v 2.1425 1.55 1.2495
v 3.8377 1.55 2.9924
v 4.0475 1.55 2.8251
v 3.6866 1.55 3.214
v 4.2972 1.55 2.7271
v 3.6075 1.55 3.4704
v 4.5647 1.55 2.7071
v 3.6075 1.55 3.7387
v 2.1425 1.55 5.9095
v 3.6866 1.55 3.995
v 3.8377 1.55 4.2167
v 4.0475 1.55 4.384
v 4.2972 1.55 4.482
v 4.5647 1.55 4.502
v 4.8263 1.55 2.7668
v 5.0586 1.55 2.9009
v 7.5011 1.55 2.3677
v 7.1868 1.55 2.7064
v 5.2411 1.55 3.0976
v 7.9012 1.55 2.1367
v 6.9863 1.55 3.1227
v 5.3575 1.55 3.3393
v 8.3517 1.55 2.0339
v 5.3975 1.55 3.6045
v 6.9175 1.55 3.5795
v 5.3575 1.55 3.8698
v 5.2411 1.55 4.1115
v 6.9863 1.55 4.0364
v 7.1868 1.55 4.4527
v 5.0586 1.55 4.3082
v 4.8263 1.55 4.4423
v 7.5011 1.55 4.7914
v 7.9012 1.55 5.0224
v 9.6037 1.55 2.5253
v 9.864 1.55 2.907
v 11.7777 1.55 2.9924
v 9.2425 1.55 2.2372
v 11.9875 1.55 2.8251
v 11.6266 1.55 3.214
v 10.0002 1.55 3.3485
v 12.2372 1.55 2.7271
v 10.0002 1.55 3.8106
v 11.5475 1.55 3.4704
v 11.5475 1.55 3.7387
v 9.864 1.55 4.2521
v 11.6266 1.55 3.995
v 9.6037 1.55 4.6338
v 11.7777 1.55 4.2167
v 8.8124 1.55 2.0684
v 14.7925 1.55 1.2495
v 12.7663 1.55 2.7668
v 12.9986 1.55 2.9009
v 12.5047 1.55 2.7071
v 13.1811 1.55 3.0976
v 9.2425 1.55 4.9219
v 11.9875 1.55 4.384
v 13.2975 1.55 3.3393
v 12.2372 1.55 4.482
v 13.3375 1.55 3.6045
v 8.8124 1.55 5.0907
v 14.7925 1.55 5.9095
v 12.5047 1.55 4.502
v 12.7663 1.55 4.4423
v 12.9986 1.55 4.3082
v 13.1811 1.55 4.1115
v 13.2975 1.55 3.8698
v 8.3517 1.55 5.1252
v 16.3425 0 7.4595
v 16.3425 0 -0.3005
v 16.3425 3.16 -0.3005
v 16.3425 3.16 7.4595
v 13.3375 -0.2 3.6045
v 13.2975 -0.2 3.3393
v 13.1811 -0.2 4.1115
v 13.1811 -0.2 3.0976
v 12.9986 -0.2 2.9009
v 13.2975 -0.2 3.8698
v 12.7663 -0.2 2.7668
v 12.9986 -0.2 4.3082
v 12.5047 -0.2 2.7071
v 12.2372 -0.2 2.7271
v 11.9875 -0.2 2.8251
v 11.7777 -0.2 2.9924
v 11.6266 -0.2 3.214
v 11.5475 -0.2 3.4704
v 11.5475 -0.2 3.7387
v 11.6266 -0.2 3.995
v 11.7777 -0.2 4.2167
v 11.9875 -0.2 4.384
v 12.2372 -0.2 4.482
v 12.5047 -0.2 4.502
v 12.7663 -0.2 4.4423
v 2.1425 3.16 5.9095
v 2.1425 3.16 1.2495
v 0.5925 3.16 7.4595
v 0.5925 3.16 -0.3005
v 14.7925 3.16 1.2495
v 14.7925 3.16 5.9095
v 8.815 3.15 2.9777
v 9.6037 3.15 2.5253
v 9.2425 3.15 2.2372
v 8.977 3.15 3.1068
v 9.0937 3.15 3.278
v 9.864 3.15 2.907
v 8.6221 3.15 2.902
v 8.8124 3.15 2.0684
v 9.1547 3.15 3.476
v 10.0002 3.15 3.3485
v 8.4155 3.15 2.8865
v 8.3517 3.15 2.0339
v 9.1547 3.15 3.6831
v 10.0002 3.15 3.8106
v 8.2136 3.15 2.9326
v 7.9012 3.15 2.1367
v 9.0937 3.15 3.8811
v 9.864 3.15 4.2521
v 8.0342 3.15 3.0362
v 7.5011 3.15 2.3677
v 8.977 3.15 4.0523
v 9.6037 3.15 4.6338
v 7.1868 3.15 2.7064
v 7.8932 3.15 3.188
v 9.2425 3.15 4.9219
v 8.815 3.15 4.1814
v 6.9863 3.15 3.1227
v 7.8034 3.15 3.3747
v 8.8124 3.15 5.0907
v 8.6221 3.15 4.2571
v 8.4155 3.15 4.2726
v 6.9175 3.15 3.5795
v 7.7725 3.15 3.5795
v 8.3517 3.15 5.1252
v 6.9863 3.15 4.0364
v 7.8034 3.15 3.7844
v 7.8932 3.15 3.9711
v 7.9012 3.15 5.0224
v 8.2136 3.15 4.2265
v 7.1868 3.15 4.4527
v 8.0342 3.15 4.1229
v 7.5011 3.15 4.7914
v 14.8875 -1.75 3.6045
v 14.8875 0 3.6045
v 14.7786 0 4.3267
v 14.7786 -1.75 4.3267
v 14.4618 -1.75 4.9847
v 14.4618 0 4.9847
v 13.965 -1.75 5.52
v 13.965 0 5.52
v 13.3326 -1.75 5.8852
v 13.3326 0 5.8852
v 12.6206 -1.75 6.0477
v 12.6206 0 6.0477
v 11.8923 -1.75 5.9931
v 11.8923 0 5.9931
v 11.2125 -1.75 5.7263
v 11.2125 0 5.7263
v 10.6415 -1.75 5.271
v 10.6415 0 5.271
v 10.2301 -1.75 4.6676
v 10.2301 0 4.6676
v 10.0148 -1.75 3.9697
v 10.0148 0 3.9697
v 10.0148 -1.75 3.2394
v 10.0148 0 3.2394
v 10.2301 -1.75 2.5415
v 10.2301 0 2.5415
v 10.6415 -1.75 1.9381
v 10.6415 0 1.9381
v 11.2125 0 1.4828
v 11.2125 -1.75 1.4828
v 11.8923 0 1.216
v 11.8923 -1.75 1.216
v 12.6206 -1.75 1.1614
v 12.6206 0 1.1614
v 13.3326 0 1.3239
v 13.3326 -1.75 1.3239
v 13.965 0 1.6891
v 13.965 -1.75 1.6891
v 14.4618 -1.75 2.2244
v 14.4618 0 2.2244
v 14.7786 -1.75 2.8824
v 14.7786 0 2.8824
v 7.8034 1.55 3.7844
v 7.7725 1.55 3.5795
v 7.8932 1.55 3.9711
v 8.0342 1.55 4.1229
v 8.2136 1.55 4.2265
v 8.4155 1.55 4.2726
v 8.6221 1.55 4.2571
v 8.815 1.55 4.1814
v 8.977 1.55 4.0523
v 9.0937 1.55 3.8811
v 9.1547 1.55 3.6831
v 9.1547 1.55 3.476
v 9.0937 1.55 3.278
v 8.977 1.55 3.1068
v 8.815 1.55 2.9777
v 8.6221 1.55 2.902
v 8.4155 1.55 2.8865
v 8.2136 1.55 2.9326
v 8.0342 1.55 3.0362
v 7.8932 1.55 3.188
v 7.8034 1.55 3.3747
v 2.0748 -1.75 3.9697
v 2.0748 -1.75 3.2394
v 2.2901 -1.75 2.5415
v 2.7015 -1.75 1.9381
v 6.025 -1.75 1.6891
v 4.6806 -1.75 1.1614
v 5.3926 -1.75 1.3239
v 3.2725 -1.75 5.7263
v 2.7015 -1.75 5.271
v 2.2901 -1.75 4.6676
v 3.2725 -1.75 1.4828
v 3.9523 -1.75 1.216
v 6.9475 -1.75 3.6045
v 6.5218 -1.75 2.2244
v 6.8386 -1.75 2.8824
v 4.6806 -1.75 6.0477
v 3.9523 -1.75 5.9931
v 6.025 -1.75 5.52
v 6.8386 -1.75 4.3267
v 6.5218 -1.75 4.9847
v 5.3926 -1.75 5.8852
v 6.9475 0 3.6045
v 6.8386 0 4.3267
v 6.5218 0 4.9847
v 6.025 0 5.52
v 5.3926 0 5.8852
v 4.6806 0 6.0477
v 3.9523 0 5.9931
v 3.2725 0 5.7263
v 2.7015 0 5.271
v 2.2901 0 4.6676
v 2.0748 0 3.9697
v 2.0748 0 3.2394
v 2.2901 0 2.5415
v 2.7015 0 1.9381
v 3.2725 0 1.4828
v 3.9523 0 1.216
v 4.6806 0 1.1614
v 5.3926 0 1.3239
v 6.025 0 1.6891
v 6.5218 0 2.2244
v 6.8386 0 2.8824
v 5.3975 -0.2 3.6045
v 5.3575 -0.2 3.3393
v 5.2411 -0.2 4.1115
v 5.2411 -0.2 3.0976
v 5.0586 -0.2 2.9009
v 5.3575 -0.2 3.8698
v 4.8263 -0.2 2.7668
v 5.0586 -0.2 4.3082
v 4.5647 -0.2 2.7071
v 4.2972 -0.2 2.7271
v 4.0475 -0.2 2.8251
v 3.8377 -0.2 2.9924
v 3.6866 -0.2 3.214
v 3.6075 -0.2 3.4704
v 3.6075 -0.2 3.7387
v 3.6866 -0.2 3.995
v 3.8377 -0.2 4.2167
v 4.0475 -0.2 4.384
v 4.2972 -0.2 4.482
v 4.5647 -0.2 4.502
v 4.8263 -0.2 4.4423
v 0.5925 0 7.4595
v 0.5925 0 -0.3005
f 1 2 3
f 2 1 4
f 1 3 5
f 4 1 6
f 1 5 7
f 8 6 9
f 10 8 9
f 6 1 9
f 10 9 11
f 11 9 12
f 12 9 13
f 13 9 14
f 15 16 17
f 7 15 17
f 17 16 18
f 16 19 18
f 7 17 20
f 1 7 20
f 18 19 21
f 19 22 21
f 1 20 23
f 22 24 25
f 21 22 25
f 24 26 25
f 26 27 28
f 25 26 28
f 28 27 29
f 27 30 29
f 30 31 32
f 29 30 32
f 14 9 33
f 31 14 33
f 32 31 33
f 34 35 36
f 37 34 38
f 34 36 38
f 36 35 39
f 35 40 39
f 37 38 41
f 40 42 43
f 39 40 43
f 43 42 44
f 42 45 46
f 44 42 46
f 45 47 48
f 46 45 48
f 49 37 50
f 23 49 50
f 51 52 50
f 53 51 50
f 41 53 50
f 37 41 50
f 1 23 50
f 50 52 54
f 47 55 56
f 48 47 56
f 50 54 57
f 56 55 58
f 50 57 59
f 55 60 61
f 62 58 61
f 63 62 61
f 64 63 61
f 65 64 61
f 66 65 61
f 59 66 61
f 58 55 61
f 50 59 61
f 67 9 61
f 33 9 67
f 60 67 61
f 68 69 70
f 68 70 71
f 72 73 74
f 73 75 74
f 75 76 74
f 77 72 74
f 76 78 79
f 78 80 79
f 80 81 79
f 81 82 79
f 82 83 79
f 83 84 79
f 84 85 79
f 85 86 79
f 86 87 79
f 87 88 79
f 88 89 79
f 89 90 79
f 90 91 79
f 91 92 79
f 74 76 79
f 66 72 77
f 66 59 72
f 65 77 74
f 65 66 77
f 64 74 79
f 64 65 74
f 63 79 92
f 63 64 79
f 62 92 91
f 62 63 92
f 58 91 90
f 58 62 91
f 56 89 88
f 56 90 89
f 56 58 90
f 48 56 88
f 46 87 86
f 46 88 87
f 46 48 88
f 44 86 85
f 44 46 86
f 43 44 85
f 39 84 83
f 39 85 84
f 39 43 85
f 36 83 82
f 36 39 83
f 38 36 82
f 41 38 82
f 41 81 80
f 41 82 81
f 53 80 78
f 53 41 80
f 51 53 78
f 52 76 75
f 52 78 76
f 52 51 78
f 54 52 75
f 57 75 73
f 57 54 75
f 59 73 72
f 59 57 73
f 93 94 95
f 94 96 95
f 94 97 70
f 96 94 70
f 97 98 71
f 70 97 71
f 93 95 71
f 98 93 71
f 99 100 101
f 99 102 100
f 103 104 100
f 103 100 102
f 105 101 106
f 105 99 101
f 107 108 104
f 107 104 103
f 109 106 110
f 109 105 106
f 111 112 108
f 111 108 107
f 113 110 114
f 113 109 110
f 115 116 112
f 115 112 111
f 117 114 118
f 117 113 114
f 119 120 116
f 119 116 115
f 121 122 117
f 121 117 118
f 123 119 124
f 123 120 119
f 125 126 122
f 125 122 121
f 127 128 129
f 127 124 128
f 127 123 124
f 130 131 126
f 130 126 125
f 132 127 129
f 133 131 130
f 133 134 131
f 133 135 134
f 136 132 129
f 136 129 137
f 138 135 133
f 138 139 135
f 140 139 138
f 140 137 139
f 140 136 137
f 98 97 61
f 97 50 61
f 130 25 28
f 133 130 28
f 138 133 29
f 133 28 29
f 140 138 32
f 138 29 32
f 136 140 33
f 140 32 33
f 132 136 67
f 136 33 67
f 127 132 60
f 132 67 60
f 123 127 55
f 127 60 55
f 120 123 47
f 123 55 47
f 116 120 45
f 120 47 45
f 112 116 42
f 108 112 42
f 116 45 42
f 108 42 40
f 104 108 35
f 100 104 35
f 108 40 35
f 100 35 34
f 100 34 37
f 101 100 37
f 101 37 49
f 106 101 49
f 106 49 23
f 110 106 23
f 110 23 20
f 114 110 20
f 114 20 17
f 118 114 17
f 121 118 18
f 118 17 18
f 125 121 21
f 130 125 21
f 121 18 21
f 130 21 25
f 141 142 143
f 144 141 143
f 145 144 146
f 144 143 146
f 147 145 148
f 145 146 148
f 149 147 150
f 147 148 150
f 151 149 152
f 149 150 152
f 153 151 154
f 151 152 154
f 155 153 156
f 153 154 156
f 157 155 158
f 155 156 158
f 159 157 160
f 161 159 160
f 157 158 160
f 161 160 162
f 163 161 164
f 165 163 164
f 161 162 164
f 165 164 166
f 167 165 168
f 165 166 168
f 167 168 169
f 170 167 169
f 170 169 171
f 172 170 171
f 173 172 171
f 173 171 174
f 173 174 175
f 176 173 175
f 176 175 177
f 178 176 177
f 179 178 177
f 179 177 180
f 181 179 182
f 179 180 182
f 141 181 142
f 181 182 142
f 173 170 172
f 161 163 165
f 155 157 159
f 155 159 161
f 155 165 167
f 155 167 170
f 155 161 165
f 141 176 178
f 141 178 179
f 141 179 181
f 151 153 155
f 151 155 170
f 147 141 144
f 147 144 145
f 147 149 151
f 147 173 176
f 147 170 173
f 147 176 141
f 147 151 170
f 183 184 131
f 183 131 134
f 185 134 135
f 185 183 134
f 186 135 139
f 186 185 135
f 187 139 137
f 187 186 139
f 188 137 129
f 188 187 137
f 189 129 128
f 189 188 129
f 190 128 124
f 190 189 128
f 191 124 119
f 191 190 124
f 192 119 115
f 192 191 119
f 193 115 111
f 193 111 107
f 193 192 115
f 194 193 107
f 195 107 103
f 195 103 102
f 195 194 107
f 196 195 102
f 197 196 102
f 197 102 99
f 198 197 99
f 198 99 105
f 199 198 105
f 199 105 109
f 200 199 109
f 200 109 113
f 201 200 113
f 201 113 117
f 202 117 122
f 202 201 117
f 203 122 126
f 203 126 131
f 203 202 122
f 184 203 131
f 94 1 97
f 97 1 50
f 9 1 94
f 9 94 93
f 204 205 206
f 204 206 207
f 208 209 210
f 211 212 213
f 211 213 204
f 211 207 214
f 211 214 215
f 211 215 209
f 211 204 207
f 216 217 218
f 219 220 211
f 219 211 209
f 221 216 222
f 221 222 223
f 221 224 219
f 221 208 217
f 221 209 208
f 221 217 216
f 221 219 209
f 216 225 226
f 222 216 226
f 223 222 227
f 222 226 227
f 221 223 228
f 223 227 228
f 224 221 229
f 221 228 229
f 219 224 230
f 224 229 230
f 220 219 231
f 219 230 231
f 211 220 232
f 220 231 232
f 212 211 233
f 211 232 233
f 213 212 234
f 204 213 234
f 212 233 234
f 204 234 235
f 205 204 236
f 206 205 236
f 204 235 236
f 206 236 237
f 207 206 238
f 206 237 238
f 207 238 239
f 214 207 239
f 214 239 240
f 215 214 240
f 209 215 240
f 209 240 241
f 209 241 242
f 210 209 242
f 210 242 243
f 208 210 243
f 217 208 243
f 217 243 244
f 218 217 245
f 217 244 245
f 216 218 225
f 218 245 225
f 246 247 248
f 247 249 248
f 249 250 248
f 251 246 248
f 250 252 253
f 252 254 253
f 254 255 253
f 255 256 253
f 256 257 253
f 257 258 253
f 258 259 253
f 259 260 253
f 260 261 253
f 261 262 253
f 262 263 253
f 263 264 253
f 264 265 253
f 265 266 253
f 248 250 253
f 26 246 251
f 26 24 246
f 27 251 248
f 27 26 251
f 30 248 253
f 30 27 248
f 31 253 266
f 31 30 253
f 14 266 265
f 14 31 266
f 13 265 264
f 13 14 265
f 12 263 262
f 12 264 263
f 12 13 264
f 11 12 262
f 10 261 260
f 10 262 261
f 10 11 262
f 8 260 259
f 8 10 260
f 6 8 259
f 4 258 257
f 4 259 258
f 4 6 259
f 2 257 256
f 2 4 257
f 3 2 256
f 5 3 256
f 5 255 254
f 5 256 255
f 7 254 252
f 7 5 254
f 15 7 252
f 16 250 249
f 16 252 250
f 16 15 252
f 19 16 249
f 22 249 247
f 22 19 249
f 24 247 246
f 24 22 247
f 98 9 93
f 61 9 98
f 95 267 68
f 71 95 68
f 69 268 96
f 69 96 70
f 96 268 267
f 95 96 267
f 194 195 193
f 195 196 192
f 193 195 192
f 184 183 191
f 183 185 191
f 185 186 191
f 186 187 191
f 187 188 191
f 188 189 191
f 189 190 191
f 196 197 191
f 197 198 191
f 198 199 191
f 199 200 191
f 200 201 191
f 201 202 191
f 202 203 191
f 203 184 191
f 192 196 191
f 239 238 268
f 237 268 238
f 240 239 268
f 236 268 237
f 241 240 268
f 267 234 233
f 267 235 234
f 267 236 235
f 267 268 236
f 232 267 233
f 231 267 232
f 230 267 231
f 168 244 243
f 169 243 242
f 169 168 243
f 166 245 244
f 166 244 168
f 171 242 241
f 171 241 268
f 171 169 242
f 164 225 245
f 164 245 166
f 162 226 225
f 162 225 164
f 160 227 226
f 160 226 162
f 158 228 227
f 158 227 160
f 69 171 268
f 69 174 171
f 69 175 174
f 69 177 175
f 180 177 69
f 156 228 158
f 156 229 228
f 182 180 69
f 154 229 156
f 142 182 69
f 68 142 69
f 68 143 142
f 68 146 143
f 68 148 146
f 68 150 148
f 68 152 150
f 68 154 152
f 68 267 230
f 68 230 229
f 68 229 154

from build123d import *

# Parameters (mm, degrees)
F0_W     = 15.75
F0_H     = 7.76
F1_DEPTH = 3.16
F2_R     = 2.45
F3_DEPTH = 1.75
F4_T     = -1.55
F5_R     = 1.55
F5_R_2   = 0.695
F6_DEPTH = 1.6


with BuildPart() as f1:
    # F0 (on Front) → F1 (new body)
    with BuildSketch(Plane.XZ):
        with Locations((8.467483707, 3.5795439035)):
            Rectangle(F0_W, F0_H)
    extrude(amount=-F1_DEPTH)

    # F2 (on face) → F3 (join)
    with BuildSketch(Plane.XZ):
        with Locations((4.497483707, 3.6045439035)):
            Circle(F2_R)
        with Locations((12.437483707, 3.6045439035)):
            Circle(F2_R)
    extrude(amount=F3_DEPTH)

    # F4
    f4_openings = [f1.faces().sort_by_distance(p)[0] for p in [
        (8.467484, 3.16, 3.579544),
    ]]
    offset(amount=F4_T, openings=f4_openings, kind=Kind.INTERSECTION)

    # F5 (on face) → F6 (join)
    with BuildSketch(Plane(origin=(0, 1.55, 0), x_dir=(-1, 0, 0), z_dir=(0, 1, 0))):
        with Locations((-8.467483707, 3.5795439035)):
            Circle(F5_R)
        with Locations((-8.467483707, 3.5795439035)):
            Circle(F5_R_2, mode=Mode.SUBTRACT)
    extrude(amount=F6_DEPTH)


solid = f1.part
